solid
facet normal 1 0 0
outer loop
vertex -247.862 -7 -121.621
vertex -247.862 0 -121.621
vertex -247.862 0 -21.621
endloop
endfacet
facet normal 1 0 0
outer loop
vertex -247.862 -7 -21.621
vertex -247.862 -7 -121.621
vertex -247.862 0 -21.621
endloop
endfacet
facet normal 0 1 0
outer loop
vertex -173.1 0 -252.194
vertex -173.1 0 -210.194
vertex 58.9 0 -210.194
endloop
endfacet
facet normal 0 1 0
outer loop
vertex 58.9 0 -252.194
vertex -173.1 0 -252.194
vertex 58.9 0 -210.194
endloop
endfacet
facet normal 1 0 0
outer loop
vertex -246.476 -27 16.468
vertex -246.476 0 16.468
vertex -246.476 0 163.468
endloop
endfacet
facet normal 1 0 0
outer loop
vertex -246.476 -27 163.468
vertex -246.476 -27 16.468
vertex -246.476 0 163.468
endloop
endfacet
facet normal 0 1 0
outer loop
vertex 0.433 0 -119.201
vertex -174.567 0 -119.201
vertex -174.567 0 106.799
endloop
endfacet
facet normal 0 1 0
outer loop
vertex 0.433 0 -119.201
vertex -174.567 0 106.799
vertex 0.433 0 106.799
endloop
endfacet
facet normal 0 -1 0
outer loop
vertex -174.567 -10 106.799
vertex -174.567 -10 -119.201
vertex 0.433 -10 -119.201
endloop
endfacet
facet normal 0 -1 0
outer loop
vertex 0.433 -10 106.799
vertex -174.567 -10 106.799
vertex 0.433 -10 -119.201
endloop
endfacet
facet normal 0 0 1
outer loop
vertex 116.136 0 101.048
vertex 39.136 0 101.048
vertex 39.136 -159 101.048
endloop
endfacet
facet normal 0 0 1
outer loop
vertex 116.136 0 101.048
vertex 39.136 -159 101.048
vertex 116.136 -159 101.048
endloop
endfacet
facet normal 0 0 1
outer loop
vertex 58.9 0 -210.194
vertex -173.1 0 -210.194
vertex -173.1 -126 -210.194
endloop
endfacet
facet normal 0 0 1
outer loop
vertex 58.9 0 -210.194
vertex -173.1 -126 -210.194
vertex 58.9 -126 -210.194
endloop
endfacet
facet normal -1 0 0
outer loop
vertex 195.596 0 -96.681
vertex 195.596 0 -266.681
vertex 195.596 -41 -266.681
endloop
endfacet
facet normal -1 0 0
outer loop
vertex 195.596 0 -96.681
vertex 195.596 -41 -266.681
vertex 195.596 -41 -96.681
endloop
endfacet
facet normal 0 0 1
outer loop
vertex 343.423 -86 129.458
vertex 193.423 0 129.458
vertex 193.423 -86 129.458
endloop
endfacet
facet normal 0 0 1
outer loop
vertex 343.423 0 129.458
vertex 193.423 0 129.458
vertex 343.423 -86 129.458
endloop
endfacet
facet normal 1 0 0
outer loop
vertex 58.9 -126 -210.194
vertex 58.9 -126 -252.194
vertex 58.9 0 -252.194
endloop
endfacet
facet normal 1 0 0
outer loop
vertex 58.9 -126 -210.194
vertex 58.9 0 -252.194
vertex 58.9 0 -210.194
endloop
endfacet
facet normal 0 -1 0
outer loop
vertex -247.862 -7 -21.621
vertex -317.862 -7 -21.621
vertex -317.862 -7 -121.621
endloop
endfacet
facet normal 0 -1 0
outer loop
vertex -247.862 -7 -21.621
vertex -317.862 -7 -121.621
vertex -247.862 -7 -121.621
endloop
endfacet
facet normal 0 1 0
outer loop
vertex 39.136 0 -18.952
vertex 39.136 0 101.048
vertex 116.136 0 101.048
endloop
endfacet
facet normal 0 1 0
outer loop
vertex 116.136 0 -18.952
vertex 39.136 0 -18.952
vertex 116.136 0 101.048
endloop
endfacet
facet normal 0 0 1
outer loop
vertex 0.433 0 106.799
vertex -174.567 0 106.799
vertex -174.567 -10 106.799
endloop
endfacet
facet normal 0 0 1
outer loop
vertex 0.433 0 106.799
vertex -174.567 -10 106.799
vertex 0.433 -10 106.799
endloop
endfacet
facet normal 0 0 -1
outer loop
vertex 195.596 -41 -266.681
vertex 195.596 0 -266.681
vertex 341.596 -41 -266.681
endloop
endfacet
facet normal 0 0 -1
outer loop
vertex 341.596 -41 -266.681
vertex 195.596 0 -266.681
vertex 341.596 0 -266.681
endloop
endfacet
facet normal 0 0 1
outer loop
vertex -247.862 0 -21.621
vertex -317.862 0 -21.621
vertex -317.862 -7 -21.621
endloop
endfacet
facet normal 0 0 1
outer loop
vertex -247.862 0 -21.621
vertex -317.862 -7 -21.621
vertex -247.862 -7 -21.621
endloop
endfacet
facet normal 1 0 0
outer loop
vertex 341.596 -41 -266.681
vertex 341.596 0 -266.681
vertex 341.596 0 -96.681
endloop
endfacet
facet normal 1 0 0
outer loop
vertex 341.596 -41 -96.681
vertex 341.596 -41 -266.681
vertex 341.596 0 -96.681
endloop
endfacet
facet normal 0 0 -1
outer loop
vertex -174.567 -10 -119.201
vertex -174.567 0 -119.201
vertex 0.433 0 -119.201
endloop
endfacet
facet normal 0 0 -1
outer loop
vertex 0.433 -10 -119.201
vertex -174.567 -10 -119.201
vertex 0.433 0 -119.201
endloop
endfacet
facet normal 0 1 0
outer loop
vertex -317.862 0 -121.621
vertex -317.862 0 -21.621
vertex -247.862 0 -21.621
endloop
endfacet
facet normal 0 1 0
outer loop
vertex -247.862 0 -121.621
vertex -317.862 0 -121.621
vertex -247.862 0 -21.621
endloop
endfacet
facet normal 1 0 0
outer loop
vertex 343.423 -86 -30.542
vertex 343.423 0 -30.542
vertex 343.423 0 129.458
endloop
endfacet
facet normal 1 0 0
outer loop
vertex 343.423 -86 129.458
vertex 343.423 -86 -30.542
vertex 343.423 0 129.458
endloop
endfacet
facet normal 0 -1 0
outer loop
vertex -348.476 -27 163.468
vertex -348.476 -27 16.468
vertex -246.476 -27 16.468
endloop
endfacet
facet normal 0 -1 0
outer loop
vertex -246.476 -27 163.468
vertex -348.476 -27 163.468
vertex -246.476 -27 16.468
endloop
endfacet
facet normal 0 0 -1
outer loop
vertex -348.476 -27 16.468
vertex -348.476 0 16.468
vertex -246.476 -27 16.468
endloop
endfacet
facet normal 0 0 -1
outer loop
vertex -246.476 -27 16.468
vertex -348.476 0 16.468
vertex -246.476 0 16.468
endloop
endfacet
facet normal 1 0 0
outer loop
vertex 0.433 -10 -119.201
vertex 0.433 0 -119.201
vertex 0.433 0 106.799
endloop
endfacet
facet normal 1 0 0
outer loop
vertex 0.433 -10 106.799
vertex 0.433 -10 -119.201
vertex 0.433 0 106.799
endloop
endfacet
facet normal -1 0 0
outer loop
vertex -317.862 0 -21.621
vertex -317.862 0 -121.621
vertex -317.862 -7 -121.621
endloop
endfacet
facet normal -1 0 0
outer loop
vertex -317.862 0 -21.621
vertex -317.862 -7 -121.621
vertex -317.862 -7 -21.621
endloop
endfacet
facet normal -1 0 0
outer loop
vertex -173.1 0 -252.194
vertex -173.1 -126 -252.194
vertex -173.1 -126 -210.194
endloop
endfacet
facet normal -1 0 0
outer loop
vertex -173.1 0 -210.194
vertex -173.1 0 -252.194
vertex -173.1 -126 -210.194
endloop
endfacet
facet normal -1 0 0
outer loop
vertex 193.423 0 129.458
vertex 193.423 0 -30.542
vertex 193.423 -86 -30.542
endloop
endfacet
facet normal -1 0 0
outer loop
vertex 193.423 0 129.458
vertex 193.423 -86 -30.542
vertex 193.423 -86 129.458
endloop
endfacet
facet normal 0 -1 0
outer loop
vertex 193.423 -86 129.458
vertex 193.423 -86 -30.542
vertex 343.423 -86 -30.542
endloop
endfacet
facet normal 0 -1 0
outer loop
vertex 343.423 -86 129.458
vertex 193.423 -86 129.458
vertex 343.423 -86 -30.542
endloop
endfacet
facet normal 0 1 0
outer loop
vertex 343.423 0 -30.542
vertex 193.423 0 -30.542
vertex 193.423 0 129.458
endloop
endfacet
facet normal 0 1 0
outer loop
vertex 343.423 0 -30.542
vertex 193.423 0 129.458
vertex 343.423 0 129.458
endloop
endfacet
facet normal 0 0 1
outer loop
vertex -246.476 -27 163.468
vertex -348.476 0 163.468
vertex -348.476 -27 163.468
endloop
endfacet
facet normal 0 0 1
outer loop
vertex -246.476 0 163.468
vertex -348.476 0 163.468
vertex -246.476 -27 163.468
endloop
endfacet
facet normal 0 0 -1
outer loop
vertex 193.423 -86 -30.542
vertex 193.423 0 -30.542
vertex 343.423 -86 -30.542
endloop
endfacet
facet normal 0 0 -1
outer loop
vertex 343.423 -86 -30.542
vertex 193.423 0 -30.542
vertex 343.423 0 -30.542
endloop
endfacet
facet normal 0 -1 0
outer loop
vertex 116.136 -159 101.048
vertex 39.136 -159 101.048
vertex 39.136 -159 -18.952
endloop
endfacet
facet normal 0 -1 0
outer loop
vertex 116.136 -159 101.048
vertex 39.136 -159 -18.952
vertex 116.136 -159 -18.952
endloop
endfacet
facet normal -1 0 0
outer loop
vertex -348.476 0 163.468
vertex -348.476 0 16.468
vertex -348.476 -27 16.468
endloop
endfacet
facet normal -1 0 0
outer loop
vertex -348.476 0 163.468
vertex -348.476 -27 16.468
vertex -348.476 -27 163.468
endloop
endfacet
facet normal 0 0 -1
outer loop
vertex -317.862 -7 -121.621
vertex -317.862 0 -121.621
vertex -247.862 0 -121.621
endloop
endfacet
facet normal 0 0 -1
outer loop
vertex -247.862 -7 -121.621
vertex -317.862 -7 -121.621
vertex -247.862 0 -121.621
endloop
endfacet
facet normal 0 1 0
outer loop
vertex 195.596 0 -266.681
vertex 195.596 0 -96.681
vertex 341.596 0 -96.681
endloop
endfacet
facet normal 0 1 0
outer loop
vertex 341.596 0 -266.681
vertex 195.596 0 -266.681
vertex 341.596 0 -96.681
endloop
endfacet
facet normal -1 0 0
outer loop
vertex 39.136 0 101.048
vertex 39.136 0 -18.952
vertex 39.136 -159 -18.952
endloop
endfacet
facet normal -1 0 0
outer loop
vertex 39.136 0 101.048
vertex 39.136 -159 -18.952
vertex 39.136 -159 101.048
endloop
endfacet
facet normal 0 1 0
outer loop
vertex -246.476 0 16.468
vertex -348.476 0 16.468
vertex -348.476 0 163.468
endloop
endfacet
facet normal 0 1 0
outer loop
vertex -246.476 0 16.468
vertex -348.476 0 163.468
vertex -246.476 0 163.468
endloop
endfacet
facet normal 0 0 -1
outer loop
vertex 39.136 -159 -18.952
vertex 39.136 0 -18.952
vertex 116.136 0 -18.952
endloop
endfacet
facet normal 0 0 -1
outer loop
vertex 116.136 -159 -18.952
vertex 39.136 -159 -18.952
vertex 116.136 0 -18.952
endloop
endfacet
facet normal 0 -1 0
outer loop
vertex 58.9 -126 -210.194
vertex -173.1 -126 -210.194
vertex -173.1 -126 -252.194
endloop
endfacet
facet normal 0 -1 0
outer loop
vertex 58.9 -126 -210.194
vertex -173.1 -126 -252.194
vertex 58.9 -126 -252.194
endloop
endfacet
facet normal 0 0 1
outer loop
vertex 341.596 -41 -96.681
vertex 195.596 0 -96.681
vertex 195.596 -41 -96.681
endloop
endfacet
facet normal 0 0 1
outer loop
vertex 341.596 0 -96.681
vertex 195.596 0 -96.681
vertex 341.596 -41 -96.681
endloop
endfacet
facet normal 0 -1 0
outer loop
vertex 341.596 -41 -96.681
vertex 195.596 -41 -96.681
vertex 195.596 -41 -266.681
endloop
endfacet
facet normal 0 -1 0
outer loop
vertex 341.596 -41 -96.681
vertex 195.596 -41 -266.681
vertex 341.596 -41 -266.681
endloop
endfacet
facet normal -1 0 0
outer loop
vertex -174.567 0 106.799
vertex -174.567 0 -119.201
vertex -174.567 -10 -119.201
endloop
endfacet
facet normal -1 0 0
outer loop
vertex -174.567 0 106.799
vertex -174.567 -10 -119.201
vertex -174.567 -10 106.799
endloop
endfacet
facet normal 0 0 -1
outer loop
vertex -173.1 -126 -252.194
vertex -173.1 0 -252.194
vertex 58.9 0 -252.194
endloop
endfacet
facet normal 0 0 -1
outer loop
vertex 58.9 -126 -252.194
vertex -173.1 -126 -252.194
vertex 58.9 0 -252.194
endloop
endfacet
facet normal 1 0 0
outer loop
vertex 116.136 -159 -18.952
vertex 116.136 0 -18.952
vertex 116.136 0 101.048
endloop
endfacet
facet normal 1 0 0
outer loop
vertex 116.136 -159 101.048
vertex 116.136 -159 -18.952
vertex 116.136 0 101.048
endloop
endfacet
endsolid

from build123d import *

# Parameters (mm, degrees)
F0_W     = 175
F0_H     = 226
F1_DEPTH = 10
F0_W_2   = 77
F0_H_2   = 120
F2_DEPTH = 159
F0_W_3   = 150
F0_H_3   = 160
F3_DEPTH = 86
F0_W_4   = 232
F0_H_4   = 42
F4_DEPTH = 126
F0_W_5   = 146
F0_H_5   = 170
F5_DEPTH = 41
F0_W_6   = 102
F0_H_6   = 147
F6_DEPTH = 27
F0_W_7   = 70
F0_H_7   = 100
F7_DEPTH = 7


with BuildPart() as f1:
    # F0 (on Front) → F1 (new body)
    with BuildSketch(Plane.XZ):
        with Locations((-87.066818, -6.20121)):
            Rectangle(F0_W, F0_H)
    extrude(amount=F1_DEPTH)


with BuildPart() as f2:
    # F0 (on Front) → F2 (new body)
    with BuildSketch(Plane.XZ):
        with Locations((77.635922, 41.047567)):
            Rectangle(F0_W_2, F0_H_2)
    extrude(amount=F2_DEPTH)


with BuildPart() as f3:
    # F0 (on Front) → F3 (new body)
    with BuildSketch(Plane.XZ):
        with Locations((268.423167, 49.457917)):
            Rectangle(F0_W_3, F0_H_3)
    extrude(amount=F3_DEPTH)


with BuildPart() as f4:
    # F0 (on Front) → F4 (new body)
    with BuildSketch(Plane.XZ):
        with Locations((-57.099607, -231.194196)):
            Rectangle(F0_W_4, F0_H_4)
    extrude(amount=F4_DEPTH)


with BuildPart() as f5:
    # F0 (on Front) → F5 (new body)
    with BuildSketch(Plane.XZ):
        with Locations((268.596263, -181.681254)):
            Rectangle(F0_W_5, F0_H_5)
    extrude(amount=F5_DEPTH)


with BuildPart() as f6:
    # F0 (on Front) → F6 (new body)
    with BuildSketch(Plane.XZ):
        with Locations((-297.475769, 89.96829)):
            Rectangle(F0_W_6, F0_H_6)
    extrude(amount=F6_DEPTH)


with BuildPart() as f7:
    # F0 (on Front) → F7 (new body)
    with BuildSketch(Plane.XZ):
        with Locations((-282.861646, -71.621013)):
            Rectangle(F0_W_7, F0_H_7)
    extrude(amount=F7_DEPTH)


solid = Compound([f1.part, f2.part, f3.part, f4.part, f5.part, f6.part, f7.part])
